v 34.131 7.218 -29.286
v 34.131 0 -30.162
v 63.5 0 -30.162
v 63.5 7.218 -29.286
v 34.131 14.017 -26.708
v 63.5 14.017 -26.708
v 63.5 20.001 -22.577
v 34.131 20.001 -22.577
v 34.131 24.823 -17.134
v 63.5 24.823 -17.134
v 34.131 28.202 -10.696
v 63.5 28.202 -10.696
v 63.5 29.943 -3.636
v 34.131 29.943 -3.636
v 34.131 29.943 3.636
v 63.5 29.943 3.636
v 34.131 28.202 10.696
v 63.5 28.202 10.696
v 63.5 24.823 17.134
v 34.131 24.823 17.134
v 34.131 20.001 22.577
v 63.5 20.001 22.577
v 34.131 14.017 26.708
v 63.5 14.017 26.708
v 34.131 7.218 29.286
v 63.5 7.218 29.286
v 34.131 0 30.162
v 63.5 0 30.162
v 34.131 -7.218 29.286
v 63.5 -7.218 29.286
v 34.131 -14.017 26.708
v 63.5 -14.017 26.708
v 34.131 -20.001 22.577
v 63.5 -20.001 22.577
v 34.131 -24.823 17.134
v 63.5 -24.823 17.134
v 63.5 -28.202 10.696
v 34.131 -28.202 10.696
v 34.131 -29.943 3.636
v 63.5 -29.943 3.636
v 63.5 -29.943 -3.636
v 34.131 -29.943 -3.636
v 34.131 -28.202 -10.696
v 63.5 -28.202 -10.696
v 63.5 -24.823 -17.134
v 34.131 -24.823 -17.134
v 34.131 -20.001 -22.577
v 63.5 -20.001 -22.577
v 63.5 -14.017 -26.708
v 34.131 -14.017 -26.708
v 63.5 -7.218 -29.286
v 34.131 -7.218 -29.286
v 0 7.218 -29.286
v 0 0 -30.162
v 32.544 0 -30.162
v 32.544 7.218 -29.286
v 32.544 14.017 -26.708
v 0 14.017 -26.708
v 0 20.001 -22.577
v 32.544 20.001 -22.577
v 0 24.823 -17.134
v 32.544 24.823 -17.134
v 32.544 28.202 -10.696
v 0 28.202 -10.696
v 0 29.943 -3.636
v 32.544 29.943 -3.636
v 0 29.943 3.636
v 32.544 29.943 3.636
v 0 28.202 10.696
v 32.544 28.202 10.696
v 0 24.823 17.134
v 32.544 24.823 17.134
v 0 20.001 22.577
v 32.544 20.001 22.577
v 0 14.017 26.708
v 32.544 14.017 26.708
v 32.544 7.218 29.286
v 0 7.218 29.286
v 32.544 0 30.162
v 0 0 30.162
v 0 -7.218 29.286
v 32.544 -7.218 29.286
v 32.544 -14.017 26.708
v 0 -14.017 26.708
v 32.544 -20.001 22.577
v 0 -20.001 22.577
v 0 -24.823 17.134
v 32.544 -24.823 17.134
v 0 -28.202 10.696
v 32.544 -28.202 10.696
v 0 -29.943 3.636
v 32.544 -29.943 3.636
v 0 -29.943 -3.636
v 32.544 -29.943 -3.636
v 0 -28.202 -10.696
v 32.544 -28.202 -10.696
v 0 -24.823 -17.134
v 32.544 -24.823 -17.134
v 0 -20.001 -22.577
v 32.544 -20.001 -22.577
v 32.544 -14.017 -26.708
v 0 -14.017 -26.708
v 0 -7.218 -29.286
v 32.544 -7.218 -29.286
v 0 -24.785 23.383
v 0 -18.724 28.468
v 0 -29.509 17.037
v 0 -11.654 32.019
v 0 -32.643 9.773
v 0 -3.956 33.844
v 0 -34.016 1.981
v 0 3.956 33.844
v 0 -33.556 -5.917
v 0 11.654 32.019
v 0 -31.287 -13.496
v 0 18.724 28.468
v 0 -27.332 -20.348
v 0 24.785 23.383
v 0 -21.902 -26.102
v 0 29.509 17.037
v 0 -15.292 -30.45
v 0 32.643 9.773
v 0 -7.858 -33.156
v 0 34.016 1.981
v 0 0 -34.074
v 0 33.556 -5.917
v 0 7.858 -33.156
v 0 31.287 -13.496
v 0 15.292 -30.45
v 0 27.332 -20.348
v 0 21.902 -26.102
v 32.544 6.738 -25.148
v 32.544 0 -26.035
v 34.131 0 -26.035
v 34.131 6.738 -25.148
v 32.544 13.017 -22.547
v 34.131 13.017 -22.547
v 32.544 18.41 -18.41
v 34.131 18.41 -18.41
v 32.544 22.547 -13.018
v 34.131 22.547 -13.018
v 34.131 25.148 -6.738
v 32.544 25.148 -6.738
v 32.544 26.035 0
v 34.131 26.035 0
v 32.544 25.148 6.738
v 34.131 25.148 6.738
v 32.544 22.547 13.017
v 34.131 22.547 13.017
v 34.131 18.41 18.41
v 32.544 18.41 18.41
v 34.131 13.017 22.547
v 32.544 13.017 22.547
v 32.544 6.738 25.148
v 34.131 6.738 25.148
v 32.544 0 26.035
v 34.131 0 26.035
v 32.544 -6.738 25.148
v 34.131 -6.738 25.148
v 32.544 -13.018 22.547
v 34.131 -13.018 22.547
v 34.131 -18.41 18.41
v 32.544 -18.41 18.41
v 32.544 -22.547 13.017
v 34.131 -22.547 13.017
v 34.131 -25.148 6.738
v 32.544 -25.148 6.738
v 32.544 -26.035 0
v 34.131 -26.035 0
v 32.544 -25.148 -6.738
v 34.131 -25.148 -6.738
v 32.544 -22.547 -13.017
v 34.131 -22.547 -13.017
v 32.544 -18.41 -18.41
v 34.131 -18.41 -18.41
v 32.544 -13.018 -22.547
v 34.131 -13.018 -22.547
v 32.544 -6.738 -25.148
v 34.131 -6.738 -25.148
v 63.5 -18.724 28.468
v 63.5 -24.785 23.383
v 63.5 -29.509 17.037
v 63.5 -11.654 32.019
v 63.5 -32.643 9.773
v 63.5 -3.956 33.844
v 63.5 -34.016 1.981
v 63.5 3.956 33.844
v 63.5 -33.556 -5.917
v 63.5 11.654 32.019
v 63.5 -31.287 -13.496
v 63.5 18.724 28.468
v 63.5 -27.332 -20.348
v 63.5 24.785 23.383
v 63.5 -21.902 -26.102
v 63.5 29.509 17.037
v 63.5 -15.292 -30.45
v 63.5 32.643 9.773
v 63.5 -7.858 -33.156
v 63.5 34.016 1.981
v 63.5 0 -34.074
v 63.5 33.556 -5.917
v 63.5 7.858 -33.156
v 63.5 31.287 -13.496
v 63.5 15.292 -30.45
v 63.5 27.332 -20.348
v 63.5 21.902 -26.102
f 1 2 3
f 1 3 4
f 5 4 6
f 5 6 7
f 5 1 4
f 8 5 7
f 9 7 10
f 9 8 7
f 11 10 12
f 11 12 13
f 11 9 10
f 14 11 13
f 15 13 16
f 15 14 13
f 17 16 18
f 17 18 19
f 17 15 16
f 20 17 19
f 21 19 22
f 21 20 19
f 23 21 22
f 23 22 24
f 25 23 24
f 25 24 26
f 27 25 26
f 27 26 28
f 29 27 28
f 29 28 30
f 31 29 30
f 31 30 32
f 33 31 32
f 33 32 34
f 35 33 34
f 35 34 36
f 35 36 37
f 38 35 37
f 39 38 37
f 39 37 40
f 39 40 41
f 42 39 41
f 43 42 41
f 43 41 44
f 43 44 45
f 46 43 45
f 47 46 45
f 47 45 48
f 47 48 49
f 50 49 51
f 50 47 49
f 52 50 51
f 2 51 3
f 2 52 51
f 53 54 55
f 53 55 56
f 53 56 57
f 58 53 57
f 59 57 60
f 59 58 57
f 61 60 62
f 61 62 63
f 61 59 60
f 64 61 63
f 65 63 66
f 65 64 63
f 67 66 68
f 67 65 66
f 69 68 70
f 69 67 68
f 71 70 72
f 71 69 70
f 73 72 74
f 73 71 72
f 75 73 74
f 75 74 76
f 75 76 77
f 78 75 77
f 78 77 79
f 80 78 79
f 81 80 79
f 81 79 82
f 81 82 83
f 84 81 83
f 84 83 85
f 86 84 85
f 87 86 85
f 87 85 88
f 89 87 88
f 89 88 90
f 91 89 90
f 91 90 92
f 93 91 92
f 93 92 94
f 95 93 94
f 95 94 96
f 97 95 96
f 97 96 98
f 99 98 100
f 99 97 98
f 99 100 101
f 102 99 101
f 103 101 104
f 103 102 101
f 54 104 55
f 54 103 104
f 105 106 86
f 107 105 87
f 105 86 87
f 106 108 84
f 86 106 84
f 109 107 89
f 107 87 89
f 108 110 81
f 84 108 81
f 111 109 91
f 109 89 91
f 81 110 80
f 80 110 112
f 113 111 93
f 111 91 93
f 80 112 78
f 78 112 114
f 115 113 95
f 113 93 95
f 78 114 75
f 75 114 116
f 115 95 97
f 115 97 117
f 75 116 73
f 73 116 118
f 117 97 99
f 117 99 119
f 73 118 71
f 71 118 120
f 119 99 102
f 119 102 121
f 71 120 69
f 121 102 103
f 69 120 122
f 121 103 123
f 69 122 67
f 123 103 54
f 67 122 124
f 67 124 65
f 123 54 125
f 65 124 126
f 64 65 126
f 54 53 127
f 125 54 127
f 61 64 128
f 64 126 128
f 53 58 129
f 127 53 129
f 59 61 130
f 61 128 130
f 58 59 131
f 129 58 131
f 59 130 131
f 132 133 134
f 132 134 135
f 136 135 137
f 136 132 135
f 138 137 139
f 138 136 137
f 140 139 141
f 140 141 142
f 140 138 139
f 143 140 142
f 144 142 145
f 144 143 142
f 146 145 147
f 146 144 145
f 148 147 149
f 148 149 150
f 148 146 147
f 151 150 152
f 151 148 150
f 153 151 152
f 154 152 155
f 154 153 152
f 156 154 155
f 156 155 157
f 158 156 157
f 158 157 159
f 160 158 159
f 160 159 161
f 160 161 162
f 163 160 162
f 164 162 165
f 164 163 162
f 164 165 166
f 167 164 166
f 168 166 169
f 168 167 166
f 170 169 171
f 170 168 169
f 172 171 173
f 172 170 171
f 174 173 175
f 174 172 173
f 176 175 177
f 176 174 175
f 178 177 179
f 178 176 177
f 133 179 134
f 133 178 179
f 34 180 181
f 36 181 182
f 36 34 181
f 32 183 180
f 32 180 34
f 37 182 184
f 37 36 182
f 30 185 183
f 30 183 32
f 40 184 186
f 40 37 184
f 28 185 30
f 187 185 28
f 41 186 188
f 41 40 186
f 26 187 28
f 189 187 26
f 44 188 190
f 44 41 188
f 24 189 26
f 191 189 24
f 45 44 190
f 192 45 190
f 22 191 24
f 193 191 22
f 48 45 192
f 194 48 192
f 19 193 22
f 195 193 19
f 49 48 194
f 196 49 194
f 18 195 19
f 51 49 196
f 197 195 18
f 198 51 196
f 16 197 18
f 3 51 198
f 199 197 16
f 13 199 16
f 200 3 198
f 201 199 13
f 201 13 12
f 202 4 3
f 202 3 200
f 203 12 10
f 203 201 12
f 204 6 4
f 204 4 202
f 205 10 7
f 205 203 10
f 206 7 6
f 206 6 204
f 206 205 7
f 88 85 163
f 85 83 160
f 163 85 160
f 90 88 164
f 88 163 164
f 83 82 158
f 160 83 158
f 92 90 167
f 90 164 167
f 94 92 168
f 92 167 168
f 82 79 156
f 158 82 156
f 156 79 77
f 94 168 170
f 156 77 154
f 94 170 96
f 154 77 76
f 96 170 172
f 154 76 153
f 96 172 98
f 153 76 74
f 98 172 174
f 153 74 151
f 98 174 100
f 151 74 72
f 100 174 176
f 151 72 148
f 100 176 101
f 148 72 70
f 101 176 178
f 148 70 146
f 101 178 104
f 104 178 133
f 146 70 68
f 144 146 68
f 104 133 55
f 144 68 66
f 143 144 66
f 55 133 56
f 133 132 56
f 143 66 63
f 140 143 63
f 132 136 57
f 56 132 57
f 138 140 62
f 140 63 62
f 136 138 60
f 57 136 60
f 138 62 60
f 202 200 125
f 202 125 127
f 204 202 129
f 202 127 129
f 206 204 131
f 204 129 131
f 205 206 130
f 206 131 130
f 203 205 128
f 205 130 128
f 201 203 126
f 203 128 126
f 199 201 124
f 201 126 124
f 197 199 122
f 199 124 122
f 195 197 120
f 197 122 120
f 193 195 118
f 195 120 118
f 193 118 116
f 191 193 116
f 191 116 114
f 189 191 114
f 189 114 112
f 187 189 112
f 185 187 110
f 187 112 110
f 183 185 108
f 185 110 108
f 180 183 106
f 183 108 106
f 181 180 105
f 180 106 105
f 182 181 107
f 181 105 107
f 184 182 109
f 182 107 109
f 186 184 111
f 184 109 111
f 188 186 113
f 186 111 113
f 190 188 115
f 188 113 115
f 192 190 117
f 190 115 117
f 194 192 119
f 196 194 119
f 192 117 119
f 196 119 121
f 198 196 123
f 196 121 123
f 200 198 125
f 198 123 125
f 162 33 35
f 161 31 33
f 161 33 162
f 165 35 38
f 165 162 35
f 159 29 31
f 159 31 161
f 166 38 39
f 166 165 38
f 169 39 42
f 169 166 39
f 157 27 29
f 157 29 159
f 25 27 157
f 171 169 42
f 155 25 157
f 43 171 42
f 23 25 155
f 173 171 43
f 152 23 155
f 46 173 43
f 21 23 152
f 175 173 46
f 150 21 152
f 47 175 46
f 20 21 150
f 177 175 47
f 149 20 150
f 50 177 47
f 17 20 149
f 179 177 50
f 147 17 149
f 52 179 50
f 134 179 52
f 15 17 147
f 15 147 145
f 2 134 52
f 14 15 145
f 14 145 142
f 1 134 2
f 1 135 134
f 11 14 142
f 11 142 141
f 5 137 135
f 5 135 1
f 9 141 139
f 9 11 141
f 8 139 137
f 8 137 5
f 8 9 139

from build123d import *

# Parameters (mm, degrees)
SKETCH1_R           = 34.0741
SKETCH1_R_2         = 30.1625
BOSS_EXTRUDE1_DEPTH = 63.5
BOSS_EXTRUDE2_START = -30.95625
SKETCH2_R           = 30.1625
SKETCH2_R_2         = 26.035
BOSS_EXTRUDE2_DEPTH = 1.5875


with BuildPart() as part:
    # Sketch1 → Boss-Extrude1 (new body)
    with BuildSketch(Plane(origin=(0, 0, 0), x_dir=(0, 0, -1), z_dir=(1, 0, 0))):
        Circle(SKETCH1_R)
        Circle(SKETCH1_R_2, mode=Mode.SUBTRACT)
    extrude(amount=BOSS_EXTRUDE1_DEPTH)

    # Sketch2 → Boss-Extrude2 (add)
    with BuildSketch(Plane(origin=(63.5, 0, 0), x_dir=(0, 0, -1), z_dir=(1, 0, 0)).offset(BOSS_EXTRUDE2_START)):
        Circle(SKETCH2_R)
        Circle(SKETCH2_R_2, mode=Mode.SUBTRACT)
    extrude(amount=BOSS_EXTRUDE2_DEPTH)


solid = part.part
